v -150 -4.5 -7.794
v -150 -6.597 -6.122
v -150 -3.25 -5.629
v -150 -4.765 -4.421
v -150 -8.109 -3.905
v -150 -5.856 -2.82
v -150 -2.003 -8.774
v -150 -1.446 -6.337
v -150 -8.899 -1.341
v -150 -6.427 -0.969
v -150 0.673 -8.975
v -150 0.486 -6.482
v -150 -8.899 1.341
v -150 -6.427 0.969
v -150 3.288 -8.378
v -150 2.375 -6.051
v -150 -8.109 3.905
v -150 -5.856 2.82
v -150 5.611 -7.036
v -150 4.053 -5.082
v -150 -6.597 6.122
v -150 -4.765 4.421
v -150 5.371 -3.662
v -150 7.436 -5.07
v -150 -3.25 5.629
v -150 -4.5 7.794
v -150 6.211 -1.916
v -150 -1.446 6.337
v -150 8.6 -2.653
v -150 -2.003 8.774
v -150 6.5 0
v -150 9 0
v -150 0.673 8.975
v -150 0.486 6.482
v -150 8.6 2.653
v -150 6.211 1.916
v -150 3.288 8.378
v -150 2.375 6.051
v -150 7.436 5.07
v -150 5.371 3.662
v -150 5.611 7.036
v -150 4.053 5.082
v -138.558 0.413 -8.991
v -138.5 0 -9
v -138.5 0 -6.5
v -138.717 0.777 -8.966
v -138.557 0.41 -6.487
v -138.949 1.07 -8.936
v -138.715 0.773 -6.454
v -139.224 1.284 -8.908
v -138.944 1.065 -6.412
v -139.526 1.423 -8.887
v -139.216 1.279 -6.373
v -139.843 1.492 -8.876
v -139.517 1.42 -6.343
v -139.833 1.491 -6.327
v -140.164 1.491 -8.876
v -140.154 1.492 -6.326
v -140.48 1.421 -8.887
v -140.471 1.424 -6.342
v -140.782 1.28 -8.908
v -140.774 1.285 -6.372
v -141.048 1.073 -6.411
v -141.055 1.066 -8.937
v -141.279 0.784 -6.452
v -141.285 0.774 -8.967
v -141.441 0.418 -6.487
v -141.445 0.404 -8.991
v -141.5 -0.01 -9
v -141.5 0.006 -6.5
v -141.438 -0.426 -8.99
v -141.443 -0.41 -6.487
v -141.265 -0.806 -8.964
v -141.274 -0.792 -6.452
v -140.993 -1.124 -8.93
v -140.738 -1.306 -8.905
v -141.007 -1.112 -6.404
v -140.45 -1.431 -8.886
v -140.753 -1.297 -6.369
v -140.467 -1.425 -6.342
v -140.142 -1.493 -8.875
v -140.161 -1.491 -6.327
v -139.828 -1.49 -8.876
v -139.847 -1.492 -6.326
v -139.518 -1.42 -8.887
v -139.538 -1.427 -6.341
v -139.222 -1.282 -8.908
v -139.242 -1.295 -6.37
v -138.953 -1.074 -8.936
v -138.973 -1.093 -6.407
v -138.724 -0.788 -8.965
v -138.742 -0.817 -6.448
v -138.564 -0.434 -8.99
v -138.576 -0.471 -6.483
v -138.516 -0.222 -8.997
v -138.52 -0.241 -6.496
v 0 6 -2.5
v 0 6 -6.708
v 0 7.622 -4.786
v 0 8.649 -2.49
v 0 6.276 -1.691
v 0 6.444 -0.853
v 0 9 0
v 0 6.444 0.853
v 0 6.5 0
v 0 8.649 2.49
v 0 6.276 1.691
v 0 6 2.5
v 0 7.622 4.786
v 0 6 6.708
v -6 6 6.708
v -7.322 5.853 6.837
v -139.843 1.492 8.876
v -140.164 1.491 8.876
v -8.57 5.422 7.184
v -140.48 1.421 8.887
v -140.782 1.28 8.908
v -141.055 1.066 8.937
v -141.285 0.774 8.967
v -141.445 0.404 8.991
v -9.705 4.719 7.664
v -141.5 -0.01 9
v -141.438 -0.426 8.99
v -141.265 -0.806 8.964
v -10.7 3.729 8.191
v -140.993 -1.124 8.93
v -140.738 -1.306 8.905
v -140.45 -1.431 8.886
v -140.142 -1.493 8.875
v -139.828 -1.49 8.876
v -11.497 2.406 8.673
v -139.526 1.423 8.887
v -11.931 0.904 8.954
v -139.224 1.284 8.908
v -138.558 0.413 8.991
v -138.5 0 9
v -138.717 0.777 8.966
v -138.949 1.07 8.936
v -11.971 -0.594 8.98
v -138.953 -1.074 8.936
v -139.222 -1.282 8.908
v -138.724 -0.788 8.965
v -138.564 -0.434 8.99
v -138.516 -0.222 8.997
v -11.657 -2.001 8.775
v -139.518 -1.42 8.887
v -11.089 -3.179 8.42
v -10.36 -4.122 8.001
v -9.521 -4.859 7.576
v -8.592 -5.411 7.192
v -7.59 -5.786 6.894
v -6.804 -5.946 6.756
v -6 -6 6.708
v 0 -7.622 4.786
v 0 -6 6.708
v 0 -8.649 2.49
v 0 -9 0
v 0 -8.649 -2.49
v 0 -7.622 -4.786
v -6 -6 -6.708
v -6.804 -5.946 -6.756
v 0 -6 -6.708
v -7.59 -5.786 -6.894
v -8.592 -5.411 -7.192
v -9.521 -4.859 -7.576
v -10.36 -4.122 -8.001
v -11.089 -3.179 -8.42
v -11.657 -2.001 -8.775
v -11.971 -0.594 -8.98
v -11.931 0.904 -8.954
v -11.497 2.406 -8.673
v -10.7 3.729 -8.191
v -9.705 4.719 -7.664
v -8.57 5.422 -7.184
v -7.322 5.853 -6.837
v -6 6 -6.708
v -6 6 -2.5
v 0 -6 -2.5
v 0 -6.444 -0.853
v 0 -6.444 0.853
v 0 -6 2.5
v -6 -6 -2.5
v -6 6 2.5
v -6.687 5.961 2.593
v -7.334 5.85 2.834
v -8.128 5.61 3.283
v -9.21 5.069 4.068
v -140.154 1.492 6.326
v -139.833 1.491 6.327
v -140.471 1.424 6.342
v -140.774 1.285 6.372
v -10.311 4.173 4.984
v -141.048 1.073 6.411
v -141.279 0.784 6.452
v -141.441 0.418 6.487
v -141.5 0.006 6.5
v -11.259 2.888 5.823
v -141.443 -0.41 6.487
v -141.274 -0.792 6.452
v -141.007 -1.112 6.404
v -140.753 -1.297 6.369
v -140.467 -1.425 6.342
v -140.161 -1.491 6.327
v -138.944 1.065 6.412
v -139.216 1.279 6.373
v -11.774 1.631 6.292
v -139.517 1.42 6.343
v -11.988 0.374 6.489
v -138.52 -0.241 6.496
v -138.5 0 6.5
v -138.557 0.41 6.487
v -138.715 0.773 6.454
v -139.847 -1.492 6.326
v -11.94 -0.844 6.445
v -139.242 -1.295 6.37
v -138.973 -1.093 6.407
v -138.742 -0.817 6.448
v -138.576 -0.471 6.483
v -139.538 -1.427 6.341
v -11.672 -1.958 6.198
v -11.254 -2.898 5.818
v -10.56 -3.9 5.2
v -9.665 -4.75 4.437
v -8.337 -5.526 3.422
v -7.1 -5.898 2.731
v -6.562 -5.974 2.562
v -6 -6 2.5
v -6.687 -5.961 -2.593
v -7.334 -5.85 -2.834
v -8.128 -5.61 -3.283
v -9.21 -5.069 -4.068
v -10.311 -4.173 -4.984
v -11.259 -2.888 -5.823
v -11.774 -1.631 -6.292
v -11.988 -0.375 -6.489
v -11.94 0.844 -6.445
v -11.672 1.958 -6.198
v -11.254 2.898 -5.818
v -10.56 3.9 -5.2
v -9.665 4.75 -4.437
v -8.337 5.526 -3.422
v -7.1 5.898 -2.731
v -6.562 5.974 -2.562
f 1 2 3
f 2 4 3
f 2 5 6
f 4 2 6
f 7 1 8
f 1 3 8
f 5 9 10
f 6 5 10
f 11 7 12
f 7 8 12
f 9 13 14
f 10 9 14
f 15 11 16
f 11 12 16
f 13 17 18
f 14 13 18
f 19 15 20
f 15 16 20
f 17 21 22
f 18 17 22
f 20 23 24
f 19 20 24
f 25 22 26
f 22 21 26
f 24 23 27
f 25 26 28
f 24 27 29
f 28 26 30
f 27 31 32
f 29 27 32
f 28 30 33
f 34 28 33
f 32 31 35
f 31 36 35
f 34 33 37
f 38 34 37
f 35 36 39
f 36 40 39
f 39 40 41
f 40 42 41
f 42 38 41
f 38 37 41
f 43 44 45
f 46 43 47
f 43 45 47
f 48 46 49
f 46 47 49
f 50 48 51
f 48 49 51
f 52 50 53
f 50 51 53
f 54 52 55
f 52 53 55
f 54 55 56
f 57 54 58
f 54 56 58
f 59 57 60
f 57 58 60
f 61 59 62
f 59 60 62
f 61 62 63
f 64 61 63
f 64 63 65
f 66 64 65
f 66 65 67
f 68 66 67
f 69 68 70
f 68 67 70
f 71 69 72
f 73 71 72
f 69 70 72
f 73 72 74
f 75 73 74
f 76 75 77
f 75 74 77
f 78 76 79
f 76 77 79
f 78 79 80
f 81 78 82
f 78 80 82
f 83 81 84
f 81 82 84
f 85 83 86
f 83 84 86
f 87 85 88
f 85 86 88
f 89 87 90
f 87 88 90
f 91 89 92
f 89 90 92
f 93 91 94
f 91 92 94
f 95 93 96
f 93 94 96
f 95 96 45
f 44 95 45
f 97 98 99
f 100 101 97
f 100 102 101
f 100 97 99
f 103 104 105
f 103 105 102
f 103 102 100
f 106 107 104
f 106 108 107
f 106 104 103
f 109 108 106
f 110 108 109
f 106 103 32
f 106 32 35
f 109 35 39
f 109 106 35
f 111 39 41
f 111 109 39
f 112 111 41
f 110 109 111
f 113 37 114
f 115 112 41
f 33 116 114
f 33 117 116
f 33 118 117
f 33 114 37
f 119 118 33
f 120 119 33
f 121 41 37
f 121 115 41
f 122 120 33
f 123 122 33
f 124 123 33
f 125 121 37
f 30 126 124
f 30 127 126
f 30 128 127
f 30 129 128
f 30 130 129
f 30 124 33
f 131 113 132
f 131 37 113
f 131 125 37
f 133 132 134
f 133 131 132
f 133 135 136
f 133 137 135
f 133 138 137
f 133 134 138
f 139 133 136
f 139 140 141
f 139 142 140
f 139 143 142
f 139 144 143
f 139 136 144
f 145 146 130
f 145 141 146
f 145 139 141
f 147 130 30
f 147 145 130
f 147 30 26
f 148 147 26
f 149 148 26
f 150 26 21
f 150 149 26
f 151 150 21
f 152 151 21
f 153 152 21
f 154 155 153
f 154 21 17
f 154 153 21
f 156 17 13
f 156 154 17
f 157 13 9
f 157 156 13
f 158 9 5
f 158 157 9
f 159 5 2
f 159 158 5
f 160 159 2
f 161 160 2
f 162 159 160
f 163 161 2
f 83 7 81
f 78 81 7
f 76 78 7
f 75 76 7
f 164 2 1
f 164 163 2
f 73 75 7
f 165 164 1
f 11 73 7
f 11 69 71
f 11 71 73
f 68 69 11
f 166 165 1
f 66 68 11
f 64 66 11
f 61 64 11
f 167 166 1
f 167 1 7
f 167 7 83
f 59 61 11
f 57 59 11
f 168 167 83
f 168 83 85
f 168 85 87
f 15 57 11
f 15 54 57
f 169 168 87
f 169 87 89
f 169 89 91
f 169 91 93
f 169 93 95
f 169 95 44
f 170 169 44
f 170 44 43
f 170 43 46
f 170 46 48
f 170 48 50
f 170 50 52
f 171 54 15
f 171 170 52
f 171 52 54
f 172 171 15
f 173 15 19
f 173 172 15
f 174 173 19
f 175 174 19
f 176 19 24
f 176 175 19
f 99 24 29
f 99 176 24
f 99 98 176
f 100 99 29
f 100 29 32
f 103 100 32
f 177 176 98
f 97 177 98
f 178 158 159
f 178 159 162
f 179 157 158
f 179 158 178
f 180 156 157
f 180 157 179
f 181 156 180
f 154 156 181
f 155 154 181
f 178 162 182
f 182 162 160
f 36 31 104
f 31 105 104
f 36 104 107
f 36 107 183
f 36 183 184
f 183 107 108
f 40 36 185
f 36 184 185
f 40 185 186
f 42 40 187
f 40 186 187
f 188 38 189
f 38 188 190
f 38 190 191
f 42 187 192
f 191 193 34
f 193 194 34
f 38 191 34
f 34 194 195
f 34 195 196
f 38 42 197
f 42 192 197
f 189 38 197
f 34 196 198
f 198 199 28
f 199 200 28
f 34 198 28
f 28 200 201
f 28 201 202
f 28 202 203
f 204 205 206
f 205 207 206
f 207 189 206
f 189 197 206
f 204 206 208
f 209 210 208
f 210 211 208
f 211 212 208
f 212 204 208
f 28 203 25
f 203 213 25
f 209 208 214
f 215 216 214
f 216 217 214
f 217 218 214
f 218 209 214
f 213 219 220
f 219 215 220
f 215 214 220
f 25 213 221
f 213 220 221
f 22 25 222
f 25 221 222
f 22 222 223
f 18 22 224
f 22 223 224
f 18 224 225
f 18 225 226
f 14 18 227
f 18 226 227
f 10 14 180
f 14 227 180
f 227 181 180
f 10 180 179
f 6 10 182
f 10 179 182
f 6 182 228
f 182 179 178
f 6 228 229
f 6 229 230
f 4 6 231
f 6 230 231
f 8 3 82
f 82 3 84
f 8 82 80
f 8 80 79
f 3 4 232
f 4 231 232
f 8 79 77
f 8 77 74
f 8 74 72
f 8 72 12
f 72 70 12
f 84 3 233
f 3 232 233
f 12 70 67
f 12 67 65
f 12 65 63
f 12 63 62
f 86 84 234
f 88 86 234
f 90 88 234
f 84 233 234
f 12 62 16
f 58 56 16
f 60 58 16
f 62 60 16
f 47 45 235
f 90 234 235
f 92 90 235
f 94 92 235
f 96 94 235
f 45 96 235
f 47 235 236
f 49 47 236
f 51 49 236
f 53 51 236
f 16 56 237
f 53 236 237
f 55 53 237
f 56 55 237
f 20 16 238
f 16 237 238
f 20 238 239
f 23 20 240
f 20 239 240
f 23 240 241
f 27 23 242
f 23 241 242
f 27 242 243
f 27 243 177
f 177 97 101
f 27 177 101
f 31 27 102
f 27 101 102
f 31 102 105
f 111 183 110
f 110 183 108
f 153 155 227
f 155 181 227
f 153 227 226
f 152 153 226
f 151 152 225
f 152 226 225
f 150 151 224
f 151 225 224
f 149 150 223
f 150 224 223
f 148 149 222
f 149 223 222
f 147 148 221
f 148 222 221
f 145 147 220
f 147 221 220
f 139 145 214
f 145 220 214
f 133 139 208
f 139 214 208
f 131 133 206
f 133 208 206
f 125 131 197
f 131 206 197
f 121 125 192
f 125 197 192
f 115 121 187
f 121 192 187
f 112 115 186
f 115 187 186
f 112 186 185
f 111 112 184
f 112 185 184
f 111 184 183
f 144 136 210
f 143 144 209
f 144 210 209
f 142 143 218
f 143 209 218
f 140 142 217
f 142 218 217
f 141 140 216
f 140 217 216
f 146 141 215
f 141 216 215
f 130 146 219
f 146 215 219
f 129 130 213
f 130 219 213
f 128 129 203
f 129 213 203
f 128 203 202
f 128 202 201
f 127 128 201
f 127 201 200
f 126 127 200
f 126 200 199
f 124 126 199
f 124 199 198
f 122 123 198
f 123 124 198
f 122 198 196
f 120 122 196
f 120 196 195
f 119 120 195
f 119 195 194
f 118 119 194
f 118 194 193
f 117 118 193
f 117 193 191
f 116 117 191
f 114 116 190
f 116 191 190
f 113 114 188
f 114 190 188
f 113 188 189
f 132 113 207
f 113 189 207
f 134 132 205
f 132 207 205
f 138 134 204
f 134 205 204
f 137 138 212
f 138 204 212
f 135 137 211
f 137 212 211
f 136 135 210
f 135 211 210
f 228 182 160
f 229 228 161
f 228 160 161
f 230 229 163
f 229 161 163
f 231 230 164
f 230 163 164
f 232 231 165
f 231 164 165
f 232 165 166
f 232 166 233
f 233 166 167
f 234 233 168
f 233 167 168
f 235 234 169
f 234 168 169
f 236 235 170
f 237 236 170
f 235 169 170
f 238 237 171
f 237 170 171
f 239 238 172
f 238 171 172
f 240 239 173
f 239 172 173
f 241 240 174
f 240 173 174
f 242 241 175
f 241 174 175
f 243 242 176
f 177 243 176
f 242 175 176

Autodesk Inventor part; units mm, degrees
ref_plane "YZ Plane" through (0, 0, 0) normal (1, 0, 0) x (0, 1, 0)
ref_plane "XZ Plane" through (0, 0, 0) normal (0, 1, 0) x (-1, 0, 0)
ref_plane "XY Plane" through (0, 0, 0) normal (0, 0, 1) x (1, 0, 0)
sketch "スケッチ1" plane through (0, 0, 0) normal (1, 0, 0) x (0, 1, 0)
  circle A0 centre (0, 0) radius 9
  circle A1 centre (0, 0) radius 6.5
  dimension "d0" = 18
  dimension "d1" = 13
extrude "押し出し1" add sketch "スケッチ1" against normal blind 150
sketch "スケッチ2" plane through (0, 0, 0) normal (0, 0, 1) x (1, 0, 0)
  point P0 (0, 0)
sketch "スケッチ3" plane through (0, 0, 0) normal (0, 0, 1) x (1, 0, 0)
  line L0 (0, 0) -> (0, 6)
  line L1 (0, -9) -> (0, 9) projected
  line L2 (0, 0) -> (0, -6)
  line L3 (0, -6) -> (-6, -6)
  line L4 (-6, -6) -> (-6, 6)
  line L5 (-6, 6) -> (0, 6)
  dimension "d4" = 6
  dimension "d5" = 6
  dimension "d6" = 6
extrude "押し出し2" cut sketch "スケッチ3" along normal mid plane 150
sketch "スケッチ4" plane through (0, 0, 0) normal (0, 0, 1) x (1, 0, 0)
  line L0 (-6, -6) -> (-6, 6) projected
  circle A0 centre (-6, 0) radius 6
  point P0 (0, 0)
extrude "押し出し3" cut sketch "スケッチ4" along normal mid plane 150 contours A0 L0 picked at (-9.4508, 1.581)
sketch "スケッチ5" plane through (0, 0, 0) normal (0, 0, 1) x (1, 0, 0)
  circle A0 centre (-140, 0) radius 1.5
  point P0 (0, 0)
  dimension "d11" = 3
extrude "押し出し4" cut sketch "スケッチ5" along normal mid plane 150
thread "ねじ1" size "M3x0.5" class "6H" standard "ANSI Metric M Profile" full length
thread "ねじ2" size "M3x0.5" class "6H" standard "ANSI Metric M Profile" full length
properties part number "vp13_150" material "PVC 配管"
